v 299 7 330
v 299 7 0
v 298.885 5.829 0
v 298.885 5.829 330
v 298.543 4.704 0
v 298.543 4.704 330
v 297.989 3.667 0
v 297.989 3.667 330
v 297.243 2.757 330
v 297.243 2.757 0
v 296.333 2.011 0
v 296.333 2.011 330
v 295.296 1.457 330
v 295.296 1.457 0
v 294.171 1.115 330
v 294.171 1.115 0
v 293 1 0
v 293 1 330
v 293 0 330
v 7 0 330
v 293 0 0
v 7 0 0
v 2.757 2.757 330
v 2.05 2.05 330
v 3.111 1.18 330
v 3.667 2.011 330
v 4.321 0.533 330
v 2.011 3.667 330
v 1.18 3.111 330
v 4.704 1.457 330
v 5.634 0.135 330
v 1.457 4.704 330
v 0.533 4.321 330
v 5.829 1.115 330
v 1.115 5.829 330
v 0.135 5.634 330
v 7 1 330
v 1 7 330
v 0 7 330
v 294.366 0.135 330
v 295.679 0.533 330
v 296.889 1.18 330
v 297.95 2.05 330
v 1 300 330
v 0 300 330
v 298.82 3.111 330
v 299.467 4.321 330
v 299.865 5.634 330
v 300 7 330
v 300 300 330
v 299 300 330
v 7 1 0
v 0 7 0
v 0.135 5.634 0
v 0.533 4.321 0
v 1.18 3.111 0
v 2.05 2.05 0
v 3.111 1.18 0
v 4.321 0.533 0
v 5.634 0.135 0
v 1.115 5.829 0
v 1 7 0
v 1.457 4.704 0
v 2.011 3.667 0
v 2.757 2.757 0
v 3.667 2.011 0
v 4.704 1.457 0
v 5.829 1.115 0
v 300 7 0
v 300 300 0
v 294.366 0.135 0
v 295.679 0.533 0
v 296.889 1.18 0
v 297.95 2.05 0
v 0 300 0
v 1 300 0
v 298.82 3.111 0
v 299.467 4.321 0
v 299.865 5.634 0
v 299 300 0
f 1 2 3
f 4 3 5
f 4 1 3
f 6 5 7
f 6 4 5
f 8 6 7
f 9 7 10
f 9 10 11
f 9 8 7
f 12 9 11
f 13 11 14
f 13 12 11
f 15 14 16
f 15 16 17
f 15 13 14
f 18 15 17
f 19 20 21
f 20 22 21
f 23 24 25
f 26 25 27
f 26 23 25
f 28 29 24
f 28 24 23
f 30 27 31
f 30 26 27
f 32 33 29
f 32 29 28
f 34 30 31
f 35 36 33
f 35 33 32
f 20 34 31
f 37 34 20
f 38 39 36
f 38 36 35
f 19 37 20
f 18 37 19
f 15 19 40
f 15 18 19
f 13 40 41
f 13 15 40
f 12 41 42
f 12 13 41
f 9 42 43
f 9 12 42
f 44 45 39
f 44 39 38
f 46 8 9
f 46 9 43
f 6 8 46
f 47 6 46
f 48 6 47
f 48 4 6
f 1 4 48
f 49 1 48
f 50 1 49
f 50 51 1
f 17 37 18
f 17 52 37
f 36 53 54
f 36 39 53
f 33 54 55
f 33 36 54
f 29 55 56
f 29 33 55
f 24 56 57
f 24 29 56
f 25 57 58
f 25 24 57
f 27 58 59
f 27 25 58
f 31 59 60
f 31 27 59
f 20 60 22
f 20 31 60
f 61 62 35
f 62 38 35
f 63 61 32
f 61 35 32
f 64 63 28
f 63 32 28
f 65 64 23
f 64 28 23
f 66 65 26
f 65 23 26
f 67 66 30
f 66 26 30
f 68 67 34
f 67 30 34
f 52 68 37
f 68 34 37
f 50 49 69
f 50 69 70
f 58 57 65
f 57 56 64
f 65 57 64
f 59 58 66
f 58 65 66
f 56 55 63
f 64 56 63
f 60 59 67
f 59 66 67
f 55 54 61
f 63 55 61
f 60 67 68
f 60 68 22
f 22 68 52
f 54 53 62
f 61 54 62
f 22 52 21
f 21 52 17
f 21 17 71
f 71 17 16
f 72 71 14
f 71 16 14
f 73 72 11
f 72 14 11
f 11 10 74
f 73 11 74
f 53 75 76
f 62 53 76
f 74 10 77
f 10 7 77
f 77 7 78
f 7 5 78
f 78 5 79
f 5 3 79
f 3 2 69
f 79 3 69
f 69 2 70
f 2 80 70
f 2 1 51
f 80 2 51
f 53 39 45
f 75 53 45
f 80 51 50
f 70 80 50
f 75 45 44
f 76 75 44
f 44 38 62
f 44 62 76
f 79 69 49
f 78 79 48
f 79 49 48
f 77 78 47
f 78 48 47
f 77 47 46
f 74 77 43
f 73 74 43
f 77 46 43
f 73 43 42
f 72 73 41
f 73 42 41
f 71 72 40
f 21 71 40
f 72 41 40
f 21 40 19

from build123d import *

# Parameters (mm, degrees)
F0_W     = 56.5631985664
F0_H     = 35.8275994658
F1_DEPTH = 330
F2_DEPTH = 300
F3_DEPTH = 300
F4_R     = 7
F5_T     = -1


with BuildPart() as f1:
    # F0 (on Top) → F1 (new body)
    with BuildSketch(Plane.XY):
        with Locations((28.2815992832, 17.9137997329)):
            Rectangle(F0_W, F0_H)
    extrude(amount=F1_DEPTH)

    # F2 (add): a face of the model
    f2_faces = [f1.faces().sort_by_distance(p)[0] for p in [
        (0, 17.9137997329, 165),
    ]]
    extrude(f2_faces, amount=-F2_DEPTH)

    # F3 (add): a face of the model
    f3_faces = [f1.faces().sort_by_distance(p)[0] for p in [
        (150, 0, 165),
    ]]
    extrude(f3_faces, amount=-F3_DEPTH)

    # F4
    f4_edges = [f1.edges().sort_by_distance(p)[0] for p in [
        (0, 0, 165),
        (300, 0, 165),
    ]]
    fillet(f4_edges, radius=F4_R)

    # F5
    f5_openings = [f1.faces().sort_by_distance(p)[0] for p in [
        (150, 150.034694, 330),
        (150, 300, 165),
        (150, 150.034694, 0),
    ]]
    offset(amount=F5_T, openings=f5_openings)


solid = f1.part
